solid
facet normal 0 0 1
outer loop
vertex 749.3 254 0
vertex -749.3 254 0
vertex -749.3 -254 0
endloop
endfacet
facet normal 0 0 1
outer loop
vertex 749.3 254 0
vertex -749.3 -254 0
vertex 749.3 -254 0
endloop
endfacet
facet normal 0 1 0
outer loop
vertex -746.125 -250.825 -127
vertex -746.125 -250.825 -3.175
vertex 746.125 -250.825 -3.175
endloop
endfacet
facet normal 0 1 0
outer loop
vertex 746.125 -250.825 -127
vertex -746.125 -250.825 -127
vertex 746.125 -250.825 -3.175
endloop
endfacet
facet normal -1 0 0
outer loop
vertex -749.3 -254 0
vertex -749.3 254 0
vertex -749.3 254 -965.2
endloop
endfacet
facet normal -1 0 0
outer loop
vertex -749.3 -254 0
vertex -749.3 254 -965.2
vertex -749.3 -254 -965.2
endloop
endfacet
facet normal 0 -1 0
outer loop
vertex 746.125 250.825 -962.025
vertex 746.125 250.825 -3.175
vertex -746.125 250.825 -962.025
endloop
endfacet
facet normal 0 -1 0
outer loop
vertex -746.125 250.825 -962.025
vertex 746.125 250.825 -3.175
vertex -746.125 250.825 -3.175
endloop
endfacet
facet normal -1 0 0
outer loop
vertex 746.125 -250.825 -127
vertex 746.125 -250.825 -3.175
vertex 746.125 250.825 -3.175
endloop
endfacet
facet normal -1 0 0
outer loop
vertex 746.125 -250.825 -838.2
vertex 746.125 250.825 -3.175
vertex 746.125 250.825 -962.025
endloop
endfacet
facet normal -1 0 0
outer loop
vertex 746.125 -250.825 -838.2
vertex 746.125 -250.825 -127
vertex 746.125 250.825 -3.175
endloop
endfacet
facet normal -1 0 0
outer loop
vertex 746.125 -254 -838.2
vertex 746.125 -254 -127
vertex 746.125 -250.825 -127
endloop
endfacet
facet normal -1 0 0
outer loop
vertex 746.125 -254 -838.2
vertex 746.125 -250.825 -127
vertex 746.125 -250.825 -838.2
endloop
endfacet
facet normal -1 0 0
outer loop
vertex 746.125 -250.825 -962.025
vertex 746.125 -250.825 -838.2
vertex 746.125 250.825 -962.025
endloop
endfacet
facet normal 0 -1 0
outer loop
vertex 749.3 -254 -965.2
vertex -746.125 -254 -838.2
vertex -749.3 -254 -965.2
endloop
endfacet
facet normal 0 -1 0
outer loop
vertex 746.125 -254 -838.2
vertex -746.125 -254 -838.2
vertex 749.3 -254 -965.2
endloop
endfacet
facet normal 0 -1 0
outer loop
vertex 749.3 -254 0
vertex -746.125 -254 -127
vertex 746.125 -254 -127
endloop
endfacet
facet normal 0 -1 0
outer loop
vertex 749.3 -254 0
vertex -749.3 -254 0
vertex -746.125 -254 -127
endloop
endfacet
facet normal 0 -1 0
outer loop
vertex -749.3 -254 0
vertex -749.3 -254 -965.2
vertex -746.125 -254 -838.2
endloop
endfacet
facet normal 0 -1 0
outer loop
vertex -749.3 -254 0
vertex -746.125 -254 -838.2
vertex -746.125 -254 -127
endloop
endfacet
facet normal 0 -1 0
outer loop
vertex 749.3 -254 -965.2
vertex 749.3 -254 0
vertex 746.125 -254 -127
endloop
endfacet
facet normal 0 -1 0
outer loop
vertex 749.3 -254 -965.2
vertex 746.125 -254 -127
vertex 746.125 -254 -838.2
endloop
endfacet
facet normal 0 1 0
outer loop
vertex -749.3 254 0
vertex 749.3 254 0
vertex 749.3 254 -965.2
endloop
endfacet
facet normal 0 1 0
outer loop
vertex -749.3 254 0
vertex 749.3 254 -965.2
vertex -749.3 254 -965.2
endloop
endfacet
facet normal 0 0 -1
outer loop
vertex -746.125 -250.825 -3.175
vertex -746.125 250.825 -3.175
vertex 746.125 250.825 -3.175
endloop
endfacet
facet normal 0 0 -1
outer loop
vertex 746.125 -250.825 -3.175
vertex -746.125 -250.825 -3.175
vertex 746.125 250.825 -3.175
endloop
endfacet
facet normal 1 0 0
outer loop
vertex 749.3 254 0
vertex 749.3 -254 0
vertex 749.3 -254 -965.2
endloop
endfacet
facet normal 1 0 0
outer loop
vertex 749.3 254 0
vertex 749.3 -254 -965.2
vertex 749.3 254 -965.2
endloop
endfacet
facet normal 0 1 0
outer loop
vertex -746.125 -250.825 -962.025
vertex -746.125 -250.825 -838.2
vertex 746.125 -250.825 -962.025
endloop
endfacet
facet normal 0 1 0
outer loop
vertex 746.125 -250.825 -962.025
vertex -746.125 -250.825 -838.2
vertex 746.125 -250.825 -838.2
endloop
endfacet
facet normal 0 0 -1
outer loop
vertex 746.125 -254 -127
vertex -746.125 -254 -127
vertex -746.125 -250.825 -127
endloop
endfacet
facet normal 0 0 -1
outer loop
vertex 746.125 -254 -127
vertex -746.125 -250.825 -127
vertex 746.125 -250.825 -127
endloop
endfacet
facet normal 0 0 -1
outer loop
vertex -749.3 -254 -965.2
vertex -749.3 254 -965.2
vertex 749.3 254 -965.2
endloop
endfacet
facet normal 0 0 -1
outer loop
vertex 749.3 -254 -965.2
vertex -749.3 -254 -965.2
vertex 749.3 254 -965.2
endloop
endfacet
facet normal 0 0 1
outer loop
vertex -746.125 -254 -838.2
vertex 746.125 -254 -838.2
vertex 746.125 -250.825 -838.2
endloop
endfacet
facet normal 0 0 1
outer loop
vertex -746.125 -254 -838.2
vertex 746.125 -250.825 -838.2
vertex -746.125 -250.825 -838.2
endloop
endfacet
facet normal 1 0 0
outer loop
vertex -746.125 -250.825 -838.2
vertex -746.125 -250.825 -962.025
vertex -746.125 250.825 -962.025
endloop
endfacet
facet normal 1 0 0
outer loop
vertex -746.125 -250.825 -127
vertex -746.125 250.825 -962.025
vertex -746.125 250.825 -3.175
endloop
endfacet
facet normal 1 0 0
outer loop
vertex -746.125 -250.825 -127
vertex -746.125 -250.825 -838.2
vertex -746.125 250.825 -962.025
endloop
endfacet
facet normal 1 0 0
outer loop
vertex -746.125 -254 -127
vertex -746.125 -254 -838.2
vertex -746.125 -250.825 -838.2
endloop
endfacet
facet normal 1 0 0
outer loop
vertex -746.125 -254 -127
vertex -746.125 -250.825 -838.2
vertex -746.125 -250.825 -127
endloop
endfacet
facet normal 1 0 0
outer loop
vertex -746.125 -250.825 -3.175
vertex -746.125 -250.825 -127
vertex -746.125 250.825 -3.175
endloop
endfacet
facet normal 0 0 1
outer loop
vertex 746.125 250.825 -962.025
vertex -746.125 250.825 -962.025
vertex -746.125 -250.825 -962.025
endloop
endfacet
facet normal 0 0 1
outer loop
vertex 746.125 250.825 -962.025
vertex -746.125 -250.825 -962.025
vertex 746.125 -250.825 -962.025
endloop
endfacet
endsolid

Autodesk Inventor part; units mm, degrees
ref_plane "YZ Plane" through (0, 0, 0) normal (1, 0, 0) x (0, 1, 0)
ref_plane "XZ Plane" through (0, 0, 0) normal (0, 1, 0) x (-1, 0, 0)
ref_plane "XY Plane" through (0, 0, 0) normal (0, 0, 1) x (1, 0, 0)
sketch "Sketch1" plane through (0, 0, 0) normal (0, 0, 1) x (1, 0, 0)
  line L0 (-749.3, -254) -> (749.3, -254)
  line L1 (749.3, -254) -> (749.3, 254)
  line L2 (749.3, 254) -> (-749.3, 254)
  line L3 (-749.3, 254) -> (-749.3, -254)
  line L4 (-749.3, -254) -> (749.3, 254) construction
  line L5 (749.3, -254) -> (-749.3, 254) construction
  point P0 (0, 0)
  dimension "d0" = 1498.6
  dimension "d1" = 508
extrude "Extrusion1" add sketch "Sketch1" against normal blind 965.2
shell "Shell1" thickness 3.175 removed faces 0
sketch "Sketch2" plane through (-749.3, -254, 0) normal (0, -1, 0) x (1, 0, 0)
  line L0 (0, 0) -> (1498.6, 0) projected
  line L1 (1498.6, -965.2) -> (0, -965.2) projected
  line L2 (3.175, -127) -> (1495.425, -127)
  line L3 (1495.425, -127) -> (1495.425, -838.2)
  line L4 (1495.425, -838.2) -> (3.175, -838.2)
  line L5 (3.175, -838.2) -> (3.175, -127)
  line L6 (3.175, -3.175) -> (3.175, -962.025) projected
  line L7 (1495.425, -3.175) -> (1495.425, -962.025) projected
  point P0 (749.3, 0)
  dimension "d5" = 127
  dimension "d6" = 127
extrude "Extrusion2" cut sketch "Sketch2" against normal blind 3.175
equation "\"d6\" = d5"
properties part number "box_middlegoal" material "Polycarbonate, Clear"
